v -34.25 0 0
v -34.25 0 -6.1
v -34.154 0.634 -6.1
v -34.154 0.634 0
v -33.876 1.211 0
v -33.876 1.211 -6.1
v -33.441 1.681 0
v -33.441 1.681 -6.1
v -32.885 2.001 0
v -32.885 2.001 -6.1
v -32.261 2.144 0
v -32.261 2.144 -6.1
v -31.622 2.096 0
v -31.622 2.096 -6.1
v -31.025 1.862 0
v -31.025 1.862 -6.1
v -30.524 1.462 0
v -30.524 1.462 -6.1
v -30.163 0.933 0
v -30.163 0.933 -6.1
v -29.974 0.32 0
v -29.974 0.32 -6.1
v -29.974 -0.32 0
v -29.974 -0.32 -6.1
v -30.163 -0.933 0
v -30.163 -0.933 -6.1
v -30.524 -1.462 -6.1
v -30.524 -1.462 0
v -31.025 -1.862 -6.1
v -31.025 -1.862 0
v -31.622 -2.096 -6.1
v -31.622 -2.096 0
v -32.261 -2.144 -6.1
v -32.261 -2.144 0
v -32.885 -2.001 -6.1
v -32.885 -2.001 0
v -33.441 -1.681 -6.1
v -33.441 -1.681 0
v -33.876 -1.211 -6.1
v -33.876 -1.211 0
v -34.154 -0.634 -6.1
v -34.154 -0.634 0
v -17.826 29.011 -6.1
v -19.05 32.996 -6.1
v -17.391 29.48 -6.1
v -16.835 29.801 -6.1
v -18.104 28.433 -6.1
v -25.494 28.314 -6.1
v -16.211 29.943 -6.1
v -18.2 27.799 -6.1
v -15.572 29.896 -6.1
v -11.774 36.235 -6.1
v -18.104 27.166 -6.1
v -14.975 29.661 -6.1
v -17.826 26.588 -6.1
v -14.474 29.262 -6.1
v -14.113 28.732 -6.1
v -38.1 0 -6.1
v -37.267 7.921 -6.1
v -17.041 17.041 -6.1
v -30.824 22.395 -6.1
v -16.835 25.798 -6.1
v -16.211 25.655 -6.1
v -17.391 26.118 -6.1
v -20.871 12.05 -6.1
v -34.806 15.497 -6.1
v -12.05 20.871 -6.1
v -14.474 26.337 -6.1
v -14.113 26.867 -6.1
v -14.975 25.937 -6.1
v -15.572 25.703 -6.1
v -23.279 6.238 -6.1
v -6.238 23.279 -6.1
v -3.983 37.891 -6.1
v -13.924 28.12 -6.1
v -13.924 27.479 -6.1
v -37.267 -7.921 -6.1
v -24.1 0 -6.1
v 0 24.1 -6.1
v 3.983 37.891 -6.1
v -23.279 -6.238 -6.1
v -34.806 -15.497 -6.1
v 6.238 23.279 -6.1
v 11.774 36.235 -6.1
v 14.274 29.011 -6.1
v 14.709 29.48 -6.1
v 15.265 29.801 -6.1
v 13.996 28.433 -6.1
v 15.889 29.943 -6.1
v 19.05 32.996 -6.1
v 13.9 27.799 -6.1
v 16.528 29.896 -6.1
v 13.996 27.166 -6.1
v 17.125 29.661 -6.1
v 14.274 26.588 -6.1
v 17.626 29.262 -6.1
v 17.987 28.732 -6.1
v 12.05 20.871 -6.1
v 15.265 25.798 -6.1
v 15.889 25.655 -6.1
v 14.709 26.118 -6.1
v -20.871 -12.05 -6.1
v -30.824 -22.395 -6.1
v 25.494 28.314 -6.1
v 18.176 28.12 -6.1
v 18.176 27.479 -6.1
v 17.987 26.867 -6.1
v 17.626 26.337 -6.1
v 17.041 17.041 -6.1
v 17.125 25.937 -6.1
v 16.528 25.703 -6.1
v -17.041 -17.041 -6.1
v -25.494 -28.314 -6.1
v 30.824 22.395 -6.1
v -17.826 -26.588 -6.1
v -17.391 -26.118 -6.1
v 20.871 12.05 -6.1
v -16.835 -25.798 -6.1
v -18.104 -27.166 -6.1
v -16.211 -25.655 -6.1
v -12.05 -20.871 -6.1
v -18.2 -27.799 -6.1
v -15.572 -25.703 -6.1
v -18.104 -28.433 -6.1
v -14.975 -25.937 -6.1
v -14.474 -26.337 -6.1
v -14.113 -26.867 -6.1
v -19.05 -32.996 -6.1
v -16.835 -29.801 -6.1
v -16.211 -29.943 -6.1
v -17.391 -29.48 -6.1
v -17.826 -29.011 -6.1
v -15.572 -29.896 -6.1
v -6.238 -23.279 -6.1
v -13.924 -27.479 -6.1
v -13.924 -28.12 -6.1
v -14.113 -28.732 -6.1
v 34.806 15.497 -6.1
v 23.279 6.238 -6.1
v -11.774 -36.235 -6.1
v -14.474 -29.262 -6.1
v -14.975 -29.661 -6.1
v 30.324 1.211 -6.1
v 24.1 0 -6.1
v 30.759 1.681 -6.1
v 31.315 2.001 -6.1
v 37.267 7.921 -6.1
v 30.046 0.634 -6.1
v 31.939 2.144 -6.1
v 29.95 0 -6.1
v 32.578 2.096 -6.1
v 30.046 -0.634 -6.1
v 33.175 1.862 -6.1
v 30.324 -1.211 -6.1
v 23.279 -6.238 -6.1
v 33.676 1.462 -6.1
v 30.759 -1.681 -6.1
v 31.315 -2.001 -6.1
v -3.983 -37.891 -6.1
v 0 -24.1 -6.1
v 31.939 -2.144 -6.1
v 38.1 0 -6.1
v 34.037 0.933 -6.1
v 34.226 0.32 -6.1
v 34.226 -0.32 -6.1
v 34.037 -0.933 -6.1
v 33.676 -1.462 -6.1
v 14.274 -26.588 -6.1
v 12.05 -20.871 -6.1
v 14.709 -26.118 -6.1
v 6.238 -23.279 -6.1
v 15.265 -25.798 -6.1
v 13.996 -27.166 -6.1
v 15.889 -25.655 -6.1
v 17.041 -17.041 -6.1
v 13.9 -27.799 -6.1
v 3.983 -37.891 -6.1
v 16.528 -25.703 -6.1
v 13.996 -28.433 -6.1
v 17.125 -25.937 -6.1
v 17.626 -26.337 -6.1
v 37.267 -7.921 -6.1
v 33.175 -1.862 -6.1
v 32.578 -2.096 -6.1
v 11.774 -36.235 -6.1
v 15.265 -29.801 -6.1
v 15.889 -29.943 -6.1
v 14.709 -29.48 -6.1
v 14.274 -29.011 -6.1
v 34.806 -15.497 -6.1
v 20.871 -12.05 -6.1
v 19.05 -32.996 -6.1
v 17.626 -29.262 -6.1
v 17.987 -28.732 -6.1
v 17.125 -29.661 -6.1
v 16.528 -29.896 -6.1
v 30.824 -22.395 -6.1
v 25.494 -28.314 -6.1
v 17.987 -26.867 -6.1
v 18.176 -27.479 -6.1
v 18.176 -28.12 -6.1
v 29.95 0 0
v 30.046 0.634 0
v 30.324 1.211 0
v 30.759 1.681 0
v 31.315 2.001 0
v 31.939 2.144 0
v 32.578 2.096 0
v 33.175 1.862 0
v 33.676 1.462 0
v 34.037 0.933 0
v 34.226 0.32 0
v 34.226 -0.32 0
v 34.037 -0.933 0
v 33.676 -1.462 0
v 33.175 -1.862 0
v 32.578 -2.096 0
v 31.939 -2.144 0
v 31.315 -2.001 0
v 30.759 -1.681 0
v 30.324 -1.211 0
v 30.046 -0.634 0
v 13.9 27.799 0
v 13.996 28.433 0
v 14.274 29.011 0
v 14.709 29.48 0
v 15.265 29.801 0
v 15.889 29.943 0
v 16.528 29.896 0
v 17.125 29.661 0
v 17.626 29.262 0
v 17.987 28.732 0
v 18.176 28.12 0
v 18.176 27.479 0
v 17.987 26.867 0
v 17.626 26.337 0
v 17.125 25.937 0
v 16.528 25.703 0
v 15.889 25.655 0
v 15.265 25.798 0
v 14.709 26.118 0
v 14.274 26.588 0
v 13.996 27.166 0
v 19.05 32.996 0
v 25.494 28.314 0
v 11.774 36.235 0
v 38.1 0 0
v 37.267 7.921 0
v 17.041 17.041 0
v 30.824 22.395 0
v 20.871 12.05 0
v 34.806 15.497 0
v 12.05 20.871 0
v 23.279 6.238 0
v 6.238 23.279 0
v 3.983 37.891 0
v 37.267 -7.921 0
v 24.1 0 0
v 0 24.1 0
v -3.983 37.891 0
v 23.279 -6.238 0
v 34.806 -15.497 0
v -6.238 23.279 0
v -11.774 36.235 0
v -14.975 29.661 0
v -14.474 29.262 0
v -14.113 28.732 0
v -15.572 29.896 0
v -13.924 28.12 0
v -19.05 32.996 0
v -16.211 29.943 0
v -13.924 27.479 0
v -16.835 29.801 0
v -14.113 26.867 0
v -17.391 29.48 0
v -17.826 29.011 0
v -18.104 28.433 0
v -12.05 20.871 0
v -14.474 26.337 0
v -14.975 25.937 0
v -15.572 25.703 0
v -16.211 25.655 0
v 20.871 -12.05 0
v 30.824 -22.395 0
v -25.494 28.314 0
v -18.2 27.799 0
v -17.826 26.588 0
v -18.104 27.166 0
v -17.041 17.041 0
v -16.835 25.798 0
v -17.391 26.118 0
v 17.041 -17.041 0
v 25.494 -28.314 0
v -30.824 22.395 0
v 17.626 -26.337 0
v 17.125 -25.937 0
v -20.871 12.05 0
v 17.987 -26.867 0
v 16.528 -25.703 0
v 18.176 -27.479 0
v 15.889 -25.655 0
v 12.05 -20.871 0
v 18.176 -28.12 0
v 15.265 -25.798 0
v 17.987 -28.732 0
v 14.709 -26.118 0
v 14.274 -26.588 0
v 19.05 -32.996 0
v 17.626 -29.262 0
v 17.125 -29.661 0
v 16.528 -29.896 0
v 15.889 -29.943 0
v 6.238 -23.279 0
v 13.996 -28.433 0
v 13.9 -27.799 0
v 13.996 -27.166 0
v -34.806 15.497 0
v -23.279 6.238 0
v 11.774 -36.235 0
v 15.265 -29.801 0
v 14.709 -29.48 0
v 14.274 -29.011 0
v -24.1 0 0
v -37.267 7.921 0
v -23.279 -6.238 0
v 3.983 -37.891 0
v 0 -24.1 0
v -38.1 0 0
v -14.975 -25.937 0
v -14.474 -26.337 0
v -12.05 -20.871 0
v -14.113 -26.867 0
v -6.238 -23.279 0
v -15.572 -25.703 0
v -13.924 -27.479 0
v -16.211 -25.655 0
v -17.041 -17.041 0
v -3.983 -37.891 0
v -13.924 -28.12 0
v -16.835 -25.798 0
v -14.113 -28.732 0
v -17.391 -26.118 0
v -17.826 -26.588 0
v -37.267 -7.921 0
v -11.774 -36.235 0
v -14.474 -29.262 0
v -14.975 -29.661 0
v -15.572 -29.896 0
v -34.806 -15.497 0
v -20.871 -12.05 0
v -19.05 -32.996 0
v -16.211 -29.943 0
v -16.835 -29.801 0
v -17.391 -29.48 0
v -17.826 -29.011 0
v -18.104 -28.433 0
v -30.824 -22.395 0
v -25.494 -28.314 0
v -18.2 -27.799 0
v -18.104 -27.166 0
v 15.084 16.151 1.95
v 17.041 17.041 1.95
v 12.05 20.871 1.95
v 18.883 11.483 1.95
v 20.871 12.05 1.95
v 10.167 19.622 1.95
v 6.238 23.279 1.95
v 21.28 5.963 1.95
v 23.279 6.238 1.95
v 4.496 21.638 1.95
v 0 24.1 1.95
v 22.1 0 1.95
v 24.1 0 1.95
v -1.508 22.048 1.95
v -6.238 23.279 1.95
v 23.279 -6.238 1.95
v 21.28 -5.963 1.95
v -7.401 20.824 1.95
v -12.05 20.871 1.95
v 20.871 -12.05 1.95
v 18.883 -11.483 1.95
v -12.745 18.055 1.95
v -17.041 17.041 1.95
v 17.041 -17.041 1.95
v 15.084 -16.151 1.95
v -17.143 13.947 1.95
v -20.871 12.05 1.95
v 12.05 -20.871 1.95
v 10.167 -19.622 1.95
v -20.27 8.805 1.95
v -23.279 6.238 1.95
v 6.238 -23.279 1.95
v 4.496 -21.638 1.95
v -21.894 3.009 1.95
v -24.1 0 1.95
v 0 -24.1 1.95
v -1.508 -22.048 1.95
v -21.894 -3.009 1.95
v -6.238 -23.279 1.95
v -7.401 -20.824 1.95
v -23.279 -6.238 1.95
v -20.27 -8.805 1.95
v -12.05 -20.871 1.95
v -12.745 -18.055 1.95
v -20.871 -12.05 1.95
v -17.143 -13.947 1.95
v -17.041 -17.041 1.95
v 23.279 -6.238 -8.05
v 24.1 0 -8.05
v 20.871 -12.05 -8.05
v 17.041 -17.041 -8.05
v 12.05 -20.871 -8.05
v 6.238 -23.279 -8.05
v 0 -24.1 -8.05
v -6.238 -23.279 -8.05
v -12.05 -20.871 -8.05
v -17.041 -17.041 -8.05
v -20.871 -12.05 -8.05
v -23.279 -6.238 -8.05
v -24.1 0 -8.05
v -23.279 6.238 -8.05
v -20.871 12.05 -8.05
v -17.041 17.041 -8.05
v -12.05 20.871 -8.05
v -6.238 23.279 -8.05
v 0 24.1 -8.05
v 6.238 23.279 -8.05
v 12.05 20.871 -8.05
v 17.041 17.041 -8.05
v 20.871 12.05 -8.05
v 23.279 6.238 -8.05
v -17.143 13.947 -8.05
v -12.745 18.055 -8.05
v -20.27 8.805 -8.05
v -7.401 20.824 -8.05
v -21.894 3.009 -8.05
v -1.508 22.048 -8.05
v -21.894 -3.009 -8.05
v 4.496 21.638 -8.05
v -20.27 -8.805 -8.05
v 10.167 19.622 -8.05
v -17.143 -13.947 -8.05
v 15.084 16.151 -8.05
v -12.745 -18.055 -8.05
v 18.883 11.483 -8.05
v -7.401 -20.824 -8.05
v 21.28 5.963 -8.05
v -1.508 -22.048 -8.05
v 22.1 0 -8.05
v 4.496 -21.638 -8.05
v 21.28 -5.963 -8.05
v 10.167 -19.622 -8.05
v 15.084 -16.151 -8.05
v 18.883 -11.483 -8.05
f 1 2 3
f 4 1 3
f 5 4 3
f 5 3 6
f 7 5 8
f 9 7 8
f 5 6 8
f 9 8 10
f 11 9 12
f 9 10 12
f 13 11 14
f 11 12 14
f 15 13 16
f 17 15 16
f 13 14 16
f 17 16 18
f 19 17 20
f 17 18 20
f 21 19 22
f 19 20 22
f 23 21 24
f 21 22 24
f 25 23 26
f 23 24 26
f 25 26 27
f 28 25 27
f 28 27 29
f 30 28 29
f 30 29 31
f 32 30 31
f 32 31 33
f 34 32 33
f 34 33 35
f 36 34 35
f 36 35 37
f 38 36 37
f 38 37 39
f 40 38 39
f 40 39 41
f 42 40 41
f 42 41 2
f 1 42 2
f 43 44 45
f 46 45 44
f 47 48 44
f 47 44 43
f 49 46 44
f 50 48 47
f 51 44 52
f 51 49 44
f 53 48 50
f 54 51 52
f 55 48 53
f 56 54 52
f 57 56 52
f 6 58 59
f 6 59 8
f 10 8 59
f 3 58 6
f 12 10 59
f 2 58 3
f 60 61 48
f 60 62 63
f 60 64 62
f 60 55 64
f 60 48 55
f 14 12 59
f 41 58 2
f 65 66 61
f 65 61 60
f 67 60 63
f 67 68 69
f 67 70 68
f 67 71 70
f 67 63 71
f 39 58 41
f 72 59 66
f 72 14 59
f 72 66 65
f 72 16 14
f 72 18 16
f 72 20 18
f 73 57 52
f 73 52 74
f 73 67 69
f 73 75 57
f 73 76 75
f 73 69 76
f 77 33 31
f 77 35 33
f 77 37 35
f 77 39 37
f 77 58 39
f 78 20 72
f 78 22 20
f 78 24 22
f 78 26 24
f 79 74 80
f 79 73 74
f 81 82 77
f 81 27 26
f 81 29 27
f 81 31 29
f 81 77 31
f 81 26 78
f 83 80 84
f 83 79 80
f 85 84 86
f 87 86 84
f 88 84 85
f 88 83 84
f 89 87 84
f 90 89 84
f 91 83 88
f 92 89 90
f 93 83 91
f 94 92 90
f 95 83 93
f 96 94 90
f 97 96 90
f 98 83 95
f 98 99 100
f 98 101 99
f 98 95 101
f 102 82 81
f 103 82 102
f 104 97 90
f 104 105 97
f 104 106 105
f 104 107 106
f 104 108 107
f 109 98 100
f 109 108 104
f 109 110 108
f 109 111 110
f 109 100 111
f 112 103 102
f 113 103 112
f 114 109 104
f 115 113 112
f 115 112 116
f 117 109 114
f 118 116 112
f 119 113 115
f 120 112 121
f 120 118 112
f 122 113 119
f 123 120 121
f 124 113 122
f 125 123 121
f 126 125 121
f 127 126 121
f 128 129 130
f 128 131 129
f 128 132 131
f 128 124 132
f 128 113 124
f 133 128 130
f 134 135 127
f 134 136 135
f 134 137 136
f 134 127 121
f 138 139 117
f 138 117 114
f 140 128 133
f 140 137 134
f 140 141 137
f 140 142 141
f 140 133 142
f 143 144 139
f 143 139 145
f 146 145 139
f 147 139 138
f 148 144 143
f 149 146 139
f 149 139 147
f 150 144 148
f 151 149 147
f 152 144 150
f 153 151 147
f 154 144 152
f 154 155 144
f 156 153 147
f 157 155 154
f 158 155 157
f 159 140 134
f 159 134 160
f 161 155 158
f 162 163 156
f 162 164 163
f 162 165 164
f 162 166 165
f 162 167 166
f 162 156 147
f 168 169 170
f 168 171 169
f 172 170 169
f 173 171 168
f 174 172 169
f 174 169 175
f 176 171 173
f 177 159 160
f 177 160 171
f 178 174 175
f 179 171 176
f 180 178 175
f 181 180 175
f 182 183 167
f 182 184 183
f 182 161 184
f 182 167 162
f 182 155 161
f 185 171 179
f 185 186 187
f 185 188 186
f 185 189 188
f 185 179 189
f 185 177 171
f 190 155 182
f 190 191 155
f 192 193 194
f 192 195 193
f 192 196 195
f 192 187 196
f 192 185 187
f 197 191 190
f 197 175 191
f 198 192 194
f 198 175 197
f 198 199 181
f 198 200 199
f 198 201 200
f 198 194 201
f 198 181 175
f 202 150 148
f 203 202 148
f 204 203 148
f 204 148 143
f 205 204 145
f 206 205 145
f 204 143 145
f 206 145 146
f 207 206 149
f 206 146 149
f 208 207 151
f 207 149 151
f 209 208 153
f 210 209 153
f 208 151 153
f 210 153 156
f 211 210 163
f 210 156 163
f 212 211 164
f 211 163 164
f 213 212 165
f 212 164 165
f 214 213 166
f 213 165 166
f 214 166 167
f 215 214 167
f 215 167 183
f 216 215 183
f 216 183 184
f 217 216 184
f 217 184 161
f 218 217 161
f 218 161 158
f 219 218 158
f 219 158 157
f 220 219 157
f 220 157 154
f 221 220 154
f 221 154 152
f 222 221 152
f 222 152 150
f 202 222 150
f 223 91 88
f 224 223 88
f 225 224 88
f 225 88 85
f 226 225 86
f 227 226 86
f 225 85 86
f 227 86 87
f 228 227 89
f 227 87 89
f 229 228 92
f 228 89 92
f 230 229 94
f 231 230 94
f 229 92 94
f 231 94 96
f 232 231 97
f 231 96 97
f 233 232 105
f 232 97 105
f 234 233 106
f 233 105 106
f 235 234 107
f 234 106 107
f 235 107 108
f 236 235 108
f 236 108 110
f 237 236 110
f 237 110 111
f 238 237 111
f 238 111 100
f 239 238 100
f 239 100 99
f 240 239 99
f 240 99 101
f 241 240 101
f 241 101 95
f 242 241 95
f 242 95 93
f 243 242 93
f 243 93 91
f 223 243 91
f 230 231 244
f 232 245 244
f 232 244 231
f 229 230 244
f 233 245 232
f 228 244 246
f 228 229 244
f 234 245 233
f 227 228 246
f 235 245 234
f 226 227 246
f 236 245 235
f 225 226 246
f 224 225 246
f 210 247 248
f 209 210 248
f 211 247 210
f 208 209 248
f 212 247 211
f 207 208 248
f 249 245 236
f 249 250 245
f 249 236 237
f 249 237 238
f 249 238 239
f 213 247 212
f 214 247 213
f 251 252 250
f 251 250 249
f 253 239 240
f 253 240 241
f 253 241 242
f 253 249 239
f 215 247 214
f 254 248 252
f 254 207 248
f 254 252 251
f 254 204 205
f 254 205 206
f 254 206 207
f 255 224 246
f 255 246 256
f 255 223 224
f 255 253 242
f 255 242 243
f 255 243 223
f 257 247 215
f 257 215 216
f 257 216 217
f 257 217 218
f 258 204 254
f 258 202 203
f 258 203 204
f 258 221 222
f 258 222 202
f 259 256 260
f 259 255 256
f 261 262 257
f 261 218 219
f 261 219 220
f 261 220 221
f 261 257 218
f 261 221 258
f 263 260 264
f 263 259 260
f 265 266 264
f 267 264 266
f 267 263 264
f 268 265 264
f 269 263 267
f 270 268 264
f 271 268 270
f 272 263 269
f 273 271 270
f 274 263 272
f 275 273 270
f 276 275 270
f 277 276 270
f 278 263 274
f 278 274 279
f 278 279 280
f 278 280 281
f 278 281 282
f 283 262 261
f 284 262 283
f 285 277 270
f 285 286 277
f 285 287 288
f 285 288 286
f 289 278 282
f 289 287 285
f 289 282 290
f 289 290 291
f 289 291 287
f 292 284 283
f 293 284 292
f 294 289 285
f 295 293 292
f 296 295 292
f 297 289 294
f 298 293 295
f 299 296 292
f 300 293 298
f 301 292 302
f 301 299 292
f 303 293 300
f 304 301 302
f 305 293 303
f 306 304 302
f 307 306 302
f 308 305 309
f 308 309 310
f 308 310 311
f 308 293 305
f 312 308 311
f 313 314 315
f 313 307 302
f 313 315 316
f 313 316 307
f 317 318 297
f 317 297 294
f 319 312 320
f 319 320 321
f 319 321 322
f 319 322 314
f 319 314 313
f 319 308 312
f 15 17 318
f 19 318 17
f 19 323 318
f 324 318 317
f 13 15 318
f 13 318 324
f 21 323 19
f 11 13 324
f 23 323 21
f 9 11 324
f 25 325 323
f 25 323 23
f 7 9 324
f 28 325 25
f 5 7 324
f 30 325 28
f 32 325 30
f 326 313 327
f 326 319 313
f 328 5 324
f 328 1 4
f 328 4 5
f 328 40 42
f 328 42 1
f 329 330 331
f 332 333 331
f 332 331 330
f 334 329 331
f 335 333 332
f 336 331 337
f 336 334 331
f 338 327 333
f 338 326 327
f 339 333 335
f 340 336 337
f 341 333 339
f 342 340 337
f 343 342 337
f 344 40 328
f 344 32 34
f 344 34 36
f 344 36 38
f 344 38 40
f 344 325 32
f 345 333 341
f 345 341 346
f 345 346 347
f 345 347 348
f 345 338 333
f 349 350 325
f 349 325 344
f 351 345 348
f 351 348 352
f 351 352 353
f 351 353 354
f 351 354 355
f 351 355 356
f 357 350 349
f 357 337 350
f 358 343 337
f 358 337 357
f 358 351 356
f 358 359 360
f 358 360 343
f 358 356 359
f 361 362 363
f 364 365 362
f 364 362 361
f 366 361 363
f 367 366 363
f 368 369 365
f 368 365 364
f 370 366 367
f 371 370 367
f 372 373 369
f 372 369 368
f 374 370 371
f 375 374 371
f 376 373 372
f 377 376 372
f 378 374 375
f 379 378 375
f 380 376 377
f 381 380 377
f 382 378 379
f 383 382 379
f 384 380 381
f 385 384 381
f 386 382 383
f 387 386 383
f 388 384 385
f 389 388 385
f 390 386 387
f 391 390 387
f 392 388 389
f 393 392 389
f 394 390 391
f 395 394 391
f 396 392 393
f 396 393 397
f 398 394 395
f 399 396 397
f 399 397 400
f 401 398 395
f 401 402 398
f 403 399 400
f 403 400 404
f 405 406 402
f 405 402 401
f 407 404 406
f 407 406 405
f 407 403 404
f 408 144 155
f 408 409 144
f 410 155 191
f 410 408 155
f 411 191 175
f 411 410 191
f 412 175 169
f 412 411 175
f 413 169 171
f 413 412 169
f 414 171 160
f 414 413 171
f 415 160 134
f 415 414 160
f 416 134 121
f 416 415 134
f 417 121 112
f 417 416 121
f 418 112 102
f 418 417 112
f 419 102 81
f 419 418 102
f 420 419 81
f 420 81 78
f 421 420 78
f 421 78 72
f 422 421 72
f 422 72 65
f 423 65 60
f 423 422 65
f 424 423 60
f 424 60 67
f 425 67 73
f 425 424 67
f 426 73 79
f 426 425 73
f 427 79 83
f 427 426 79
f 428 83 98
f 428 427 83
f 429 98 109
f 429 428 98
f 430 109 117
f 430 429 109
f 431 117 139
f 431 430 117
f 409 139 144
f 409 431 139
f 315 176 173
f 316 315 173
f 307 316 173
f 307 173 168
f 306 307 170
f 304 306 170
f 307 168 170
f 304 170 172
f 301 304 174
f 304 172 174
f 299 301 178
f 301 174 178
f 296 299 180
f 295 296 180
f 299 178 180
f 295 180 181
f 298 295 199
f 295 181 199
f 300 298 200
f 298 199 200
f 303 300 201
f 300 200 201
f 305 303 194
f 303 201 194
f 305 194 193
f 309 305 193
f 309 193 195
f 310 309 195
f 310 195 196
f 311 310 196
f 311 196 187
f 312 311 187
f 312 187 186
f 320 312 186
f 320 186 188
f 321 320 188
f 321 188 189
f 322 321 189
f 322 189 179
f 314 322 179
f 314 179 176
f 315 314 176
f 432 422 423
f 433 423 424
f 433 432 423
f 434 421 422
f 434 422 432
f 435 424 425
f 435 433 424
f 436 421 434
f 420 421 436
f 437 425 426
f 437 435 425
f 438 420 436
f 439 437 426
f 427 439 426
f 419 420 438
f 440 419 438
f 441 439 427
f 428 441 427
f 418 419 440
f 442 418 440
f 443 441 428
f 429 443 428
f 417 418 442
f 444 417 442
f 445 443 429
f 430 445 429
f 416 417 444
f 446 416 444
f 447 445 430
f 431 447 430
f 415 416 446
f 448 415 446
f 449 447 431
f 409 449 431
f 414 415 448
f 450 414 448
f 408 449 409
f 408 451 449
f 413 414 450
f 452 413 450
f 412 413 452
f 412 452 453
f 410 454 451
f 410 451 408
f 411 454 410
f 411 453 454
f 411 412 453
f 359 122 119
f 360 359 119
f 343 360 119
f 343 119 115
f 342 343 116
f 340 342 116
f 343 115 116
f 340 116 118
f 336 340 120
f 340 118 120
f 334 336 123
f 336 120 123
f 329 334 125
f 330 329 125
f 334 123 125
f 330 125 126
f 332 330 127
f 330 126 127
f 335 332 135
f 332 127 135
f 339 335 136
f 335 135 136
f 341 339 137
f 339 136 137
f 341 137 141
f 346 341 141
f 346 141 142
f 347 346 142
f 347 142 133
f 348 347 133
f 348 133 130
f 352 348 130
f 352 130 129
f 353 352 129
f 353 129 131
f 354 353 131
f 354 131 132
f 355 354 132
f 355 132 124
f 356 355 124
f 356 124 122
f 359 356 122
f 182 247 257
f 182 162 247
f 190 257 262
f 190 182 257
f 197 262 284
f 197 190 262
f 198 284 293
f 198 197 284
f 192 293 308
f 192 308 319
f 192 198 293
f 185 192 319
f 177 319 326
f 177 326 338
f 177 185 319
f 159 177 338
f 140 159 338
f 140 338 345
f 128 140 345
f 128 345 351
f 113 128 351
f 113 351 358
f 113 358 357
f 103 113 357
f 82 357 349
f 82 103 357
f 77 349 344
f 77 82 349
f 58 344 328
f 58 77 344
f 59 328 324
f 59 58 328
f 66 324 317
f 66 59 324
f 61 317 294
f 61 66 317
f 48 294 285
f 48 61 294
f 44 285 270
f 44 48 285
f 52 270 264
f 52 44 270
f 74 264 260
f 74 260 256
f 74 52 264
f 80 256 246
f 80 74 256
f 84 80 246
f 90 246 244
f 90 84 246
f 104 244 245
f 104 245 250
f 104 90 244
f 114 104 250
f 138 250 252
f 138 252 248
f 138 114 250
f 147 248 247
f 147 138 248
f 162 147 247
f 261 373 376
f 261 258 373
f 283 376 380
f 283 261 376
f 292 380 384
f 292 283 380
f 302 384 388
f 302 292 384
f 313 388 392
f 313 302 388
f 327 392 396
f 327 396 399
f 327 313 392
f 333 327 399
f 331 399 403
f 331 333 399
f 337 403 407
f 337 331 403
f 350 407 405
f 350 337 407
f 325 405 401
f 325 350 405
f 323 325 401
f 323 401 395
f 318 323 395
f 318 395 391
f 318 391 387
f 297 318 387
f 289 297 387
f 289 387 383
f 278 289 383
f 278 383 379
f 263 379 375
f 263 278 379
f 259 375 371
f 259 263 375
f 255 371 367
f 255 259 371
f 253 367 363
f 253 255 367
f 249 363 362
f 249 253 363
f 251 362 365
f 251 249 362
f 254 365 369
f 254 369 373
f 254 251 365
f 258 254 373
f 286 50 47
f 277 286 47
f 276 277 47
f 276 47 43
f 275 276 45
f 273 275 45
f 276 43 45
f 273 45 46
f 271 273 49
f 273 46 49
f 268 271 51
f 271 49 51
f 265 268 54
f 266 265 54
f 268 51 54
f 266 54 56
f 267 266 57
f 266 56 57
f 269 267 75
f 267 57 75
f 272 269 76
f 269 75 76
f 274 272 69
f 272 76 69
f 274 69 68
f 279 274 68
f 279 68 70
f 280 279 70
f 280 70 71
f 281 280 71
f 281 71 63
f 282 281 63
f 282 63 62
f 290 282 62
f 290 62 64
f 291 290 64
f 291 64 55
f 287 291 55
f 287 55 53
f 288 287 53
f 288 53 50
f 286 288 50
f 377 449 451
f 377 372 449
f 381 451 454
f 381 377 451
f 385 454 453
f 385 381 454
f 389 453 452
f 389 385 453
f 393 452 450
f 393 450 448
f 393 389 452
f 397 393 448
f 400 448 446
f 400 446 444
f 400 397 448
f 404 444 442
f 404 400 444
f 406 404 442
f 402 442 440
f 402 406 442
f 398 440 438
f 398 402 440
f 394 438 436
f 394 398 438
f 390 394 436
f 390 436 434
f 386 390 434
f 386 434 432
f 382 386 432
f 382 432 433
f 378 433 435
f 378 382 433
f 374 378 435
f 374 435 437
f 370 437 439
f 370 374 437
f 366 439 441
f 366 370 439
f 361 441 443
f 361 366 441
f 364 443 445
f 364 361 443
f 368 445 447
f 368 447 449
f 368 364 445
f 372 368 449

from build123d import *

# Parameters (mm, degrees)
SKETCH_3_R          = 2.15
CUT_EXTRUDE_2_DEPTH = 10


with BuildPart() as part:
    # 草图1 → 旋转1 (revolve)
    with BuildSketch(Plane(origin=(0, 0, 0), x_dir=(1, 0, 0), z_dir=(0, 1, 0))):
        Polygon((24.1, 0), (38.1, 0), (38.1, 6.1), (24.1, 6.1), (24.1, 8.05), (22.1, 8.05), (22.1, -1.95), (24.1, -1.95), align=None)
    revolve(axis=Axis((0, 0, 0), (0, 0, -1)))

    # 草图3 → 切除-拉伸2 (cut)
    with BuildSketch(Plane(origin=(0, 0, -6.1), x_dir=(-1, 0, 0), z_dir=(0, 0, -1))):
        with Locations((-32.1, 0)):
            Circle(SKETCH_3_R)
        with Locations((-16.05, 27.799415461)):
            Circle(SKETCH_3_R)
        with Locations((16.05, 27.799415461)):
            Circle(SKETCH_3_R)
        with Locations((32.1, 0)):
            Circle(SKETCH_3_R)
        with Locations((16.05, -27.799415461)):
            Circle(SKETCH_3_R)
        with Locations((-16.05, -27.799415461)):
            Circle(SKETCH_3_R)
    extrude(amount=-CUT_EXTRUDE_2_DEPTH, mode=Mode.SUBTRACT)


solid = part.part
